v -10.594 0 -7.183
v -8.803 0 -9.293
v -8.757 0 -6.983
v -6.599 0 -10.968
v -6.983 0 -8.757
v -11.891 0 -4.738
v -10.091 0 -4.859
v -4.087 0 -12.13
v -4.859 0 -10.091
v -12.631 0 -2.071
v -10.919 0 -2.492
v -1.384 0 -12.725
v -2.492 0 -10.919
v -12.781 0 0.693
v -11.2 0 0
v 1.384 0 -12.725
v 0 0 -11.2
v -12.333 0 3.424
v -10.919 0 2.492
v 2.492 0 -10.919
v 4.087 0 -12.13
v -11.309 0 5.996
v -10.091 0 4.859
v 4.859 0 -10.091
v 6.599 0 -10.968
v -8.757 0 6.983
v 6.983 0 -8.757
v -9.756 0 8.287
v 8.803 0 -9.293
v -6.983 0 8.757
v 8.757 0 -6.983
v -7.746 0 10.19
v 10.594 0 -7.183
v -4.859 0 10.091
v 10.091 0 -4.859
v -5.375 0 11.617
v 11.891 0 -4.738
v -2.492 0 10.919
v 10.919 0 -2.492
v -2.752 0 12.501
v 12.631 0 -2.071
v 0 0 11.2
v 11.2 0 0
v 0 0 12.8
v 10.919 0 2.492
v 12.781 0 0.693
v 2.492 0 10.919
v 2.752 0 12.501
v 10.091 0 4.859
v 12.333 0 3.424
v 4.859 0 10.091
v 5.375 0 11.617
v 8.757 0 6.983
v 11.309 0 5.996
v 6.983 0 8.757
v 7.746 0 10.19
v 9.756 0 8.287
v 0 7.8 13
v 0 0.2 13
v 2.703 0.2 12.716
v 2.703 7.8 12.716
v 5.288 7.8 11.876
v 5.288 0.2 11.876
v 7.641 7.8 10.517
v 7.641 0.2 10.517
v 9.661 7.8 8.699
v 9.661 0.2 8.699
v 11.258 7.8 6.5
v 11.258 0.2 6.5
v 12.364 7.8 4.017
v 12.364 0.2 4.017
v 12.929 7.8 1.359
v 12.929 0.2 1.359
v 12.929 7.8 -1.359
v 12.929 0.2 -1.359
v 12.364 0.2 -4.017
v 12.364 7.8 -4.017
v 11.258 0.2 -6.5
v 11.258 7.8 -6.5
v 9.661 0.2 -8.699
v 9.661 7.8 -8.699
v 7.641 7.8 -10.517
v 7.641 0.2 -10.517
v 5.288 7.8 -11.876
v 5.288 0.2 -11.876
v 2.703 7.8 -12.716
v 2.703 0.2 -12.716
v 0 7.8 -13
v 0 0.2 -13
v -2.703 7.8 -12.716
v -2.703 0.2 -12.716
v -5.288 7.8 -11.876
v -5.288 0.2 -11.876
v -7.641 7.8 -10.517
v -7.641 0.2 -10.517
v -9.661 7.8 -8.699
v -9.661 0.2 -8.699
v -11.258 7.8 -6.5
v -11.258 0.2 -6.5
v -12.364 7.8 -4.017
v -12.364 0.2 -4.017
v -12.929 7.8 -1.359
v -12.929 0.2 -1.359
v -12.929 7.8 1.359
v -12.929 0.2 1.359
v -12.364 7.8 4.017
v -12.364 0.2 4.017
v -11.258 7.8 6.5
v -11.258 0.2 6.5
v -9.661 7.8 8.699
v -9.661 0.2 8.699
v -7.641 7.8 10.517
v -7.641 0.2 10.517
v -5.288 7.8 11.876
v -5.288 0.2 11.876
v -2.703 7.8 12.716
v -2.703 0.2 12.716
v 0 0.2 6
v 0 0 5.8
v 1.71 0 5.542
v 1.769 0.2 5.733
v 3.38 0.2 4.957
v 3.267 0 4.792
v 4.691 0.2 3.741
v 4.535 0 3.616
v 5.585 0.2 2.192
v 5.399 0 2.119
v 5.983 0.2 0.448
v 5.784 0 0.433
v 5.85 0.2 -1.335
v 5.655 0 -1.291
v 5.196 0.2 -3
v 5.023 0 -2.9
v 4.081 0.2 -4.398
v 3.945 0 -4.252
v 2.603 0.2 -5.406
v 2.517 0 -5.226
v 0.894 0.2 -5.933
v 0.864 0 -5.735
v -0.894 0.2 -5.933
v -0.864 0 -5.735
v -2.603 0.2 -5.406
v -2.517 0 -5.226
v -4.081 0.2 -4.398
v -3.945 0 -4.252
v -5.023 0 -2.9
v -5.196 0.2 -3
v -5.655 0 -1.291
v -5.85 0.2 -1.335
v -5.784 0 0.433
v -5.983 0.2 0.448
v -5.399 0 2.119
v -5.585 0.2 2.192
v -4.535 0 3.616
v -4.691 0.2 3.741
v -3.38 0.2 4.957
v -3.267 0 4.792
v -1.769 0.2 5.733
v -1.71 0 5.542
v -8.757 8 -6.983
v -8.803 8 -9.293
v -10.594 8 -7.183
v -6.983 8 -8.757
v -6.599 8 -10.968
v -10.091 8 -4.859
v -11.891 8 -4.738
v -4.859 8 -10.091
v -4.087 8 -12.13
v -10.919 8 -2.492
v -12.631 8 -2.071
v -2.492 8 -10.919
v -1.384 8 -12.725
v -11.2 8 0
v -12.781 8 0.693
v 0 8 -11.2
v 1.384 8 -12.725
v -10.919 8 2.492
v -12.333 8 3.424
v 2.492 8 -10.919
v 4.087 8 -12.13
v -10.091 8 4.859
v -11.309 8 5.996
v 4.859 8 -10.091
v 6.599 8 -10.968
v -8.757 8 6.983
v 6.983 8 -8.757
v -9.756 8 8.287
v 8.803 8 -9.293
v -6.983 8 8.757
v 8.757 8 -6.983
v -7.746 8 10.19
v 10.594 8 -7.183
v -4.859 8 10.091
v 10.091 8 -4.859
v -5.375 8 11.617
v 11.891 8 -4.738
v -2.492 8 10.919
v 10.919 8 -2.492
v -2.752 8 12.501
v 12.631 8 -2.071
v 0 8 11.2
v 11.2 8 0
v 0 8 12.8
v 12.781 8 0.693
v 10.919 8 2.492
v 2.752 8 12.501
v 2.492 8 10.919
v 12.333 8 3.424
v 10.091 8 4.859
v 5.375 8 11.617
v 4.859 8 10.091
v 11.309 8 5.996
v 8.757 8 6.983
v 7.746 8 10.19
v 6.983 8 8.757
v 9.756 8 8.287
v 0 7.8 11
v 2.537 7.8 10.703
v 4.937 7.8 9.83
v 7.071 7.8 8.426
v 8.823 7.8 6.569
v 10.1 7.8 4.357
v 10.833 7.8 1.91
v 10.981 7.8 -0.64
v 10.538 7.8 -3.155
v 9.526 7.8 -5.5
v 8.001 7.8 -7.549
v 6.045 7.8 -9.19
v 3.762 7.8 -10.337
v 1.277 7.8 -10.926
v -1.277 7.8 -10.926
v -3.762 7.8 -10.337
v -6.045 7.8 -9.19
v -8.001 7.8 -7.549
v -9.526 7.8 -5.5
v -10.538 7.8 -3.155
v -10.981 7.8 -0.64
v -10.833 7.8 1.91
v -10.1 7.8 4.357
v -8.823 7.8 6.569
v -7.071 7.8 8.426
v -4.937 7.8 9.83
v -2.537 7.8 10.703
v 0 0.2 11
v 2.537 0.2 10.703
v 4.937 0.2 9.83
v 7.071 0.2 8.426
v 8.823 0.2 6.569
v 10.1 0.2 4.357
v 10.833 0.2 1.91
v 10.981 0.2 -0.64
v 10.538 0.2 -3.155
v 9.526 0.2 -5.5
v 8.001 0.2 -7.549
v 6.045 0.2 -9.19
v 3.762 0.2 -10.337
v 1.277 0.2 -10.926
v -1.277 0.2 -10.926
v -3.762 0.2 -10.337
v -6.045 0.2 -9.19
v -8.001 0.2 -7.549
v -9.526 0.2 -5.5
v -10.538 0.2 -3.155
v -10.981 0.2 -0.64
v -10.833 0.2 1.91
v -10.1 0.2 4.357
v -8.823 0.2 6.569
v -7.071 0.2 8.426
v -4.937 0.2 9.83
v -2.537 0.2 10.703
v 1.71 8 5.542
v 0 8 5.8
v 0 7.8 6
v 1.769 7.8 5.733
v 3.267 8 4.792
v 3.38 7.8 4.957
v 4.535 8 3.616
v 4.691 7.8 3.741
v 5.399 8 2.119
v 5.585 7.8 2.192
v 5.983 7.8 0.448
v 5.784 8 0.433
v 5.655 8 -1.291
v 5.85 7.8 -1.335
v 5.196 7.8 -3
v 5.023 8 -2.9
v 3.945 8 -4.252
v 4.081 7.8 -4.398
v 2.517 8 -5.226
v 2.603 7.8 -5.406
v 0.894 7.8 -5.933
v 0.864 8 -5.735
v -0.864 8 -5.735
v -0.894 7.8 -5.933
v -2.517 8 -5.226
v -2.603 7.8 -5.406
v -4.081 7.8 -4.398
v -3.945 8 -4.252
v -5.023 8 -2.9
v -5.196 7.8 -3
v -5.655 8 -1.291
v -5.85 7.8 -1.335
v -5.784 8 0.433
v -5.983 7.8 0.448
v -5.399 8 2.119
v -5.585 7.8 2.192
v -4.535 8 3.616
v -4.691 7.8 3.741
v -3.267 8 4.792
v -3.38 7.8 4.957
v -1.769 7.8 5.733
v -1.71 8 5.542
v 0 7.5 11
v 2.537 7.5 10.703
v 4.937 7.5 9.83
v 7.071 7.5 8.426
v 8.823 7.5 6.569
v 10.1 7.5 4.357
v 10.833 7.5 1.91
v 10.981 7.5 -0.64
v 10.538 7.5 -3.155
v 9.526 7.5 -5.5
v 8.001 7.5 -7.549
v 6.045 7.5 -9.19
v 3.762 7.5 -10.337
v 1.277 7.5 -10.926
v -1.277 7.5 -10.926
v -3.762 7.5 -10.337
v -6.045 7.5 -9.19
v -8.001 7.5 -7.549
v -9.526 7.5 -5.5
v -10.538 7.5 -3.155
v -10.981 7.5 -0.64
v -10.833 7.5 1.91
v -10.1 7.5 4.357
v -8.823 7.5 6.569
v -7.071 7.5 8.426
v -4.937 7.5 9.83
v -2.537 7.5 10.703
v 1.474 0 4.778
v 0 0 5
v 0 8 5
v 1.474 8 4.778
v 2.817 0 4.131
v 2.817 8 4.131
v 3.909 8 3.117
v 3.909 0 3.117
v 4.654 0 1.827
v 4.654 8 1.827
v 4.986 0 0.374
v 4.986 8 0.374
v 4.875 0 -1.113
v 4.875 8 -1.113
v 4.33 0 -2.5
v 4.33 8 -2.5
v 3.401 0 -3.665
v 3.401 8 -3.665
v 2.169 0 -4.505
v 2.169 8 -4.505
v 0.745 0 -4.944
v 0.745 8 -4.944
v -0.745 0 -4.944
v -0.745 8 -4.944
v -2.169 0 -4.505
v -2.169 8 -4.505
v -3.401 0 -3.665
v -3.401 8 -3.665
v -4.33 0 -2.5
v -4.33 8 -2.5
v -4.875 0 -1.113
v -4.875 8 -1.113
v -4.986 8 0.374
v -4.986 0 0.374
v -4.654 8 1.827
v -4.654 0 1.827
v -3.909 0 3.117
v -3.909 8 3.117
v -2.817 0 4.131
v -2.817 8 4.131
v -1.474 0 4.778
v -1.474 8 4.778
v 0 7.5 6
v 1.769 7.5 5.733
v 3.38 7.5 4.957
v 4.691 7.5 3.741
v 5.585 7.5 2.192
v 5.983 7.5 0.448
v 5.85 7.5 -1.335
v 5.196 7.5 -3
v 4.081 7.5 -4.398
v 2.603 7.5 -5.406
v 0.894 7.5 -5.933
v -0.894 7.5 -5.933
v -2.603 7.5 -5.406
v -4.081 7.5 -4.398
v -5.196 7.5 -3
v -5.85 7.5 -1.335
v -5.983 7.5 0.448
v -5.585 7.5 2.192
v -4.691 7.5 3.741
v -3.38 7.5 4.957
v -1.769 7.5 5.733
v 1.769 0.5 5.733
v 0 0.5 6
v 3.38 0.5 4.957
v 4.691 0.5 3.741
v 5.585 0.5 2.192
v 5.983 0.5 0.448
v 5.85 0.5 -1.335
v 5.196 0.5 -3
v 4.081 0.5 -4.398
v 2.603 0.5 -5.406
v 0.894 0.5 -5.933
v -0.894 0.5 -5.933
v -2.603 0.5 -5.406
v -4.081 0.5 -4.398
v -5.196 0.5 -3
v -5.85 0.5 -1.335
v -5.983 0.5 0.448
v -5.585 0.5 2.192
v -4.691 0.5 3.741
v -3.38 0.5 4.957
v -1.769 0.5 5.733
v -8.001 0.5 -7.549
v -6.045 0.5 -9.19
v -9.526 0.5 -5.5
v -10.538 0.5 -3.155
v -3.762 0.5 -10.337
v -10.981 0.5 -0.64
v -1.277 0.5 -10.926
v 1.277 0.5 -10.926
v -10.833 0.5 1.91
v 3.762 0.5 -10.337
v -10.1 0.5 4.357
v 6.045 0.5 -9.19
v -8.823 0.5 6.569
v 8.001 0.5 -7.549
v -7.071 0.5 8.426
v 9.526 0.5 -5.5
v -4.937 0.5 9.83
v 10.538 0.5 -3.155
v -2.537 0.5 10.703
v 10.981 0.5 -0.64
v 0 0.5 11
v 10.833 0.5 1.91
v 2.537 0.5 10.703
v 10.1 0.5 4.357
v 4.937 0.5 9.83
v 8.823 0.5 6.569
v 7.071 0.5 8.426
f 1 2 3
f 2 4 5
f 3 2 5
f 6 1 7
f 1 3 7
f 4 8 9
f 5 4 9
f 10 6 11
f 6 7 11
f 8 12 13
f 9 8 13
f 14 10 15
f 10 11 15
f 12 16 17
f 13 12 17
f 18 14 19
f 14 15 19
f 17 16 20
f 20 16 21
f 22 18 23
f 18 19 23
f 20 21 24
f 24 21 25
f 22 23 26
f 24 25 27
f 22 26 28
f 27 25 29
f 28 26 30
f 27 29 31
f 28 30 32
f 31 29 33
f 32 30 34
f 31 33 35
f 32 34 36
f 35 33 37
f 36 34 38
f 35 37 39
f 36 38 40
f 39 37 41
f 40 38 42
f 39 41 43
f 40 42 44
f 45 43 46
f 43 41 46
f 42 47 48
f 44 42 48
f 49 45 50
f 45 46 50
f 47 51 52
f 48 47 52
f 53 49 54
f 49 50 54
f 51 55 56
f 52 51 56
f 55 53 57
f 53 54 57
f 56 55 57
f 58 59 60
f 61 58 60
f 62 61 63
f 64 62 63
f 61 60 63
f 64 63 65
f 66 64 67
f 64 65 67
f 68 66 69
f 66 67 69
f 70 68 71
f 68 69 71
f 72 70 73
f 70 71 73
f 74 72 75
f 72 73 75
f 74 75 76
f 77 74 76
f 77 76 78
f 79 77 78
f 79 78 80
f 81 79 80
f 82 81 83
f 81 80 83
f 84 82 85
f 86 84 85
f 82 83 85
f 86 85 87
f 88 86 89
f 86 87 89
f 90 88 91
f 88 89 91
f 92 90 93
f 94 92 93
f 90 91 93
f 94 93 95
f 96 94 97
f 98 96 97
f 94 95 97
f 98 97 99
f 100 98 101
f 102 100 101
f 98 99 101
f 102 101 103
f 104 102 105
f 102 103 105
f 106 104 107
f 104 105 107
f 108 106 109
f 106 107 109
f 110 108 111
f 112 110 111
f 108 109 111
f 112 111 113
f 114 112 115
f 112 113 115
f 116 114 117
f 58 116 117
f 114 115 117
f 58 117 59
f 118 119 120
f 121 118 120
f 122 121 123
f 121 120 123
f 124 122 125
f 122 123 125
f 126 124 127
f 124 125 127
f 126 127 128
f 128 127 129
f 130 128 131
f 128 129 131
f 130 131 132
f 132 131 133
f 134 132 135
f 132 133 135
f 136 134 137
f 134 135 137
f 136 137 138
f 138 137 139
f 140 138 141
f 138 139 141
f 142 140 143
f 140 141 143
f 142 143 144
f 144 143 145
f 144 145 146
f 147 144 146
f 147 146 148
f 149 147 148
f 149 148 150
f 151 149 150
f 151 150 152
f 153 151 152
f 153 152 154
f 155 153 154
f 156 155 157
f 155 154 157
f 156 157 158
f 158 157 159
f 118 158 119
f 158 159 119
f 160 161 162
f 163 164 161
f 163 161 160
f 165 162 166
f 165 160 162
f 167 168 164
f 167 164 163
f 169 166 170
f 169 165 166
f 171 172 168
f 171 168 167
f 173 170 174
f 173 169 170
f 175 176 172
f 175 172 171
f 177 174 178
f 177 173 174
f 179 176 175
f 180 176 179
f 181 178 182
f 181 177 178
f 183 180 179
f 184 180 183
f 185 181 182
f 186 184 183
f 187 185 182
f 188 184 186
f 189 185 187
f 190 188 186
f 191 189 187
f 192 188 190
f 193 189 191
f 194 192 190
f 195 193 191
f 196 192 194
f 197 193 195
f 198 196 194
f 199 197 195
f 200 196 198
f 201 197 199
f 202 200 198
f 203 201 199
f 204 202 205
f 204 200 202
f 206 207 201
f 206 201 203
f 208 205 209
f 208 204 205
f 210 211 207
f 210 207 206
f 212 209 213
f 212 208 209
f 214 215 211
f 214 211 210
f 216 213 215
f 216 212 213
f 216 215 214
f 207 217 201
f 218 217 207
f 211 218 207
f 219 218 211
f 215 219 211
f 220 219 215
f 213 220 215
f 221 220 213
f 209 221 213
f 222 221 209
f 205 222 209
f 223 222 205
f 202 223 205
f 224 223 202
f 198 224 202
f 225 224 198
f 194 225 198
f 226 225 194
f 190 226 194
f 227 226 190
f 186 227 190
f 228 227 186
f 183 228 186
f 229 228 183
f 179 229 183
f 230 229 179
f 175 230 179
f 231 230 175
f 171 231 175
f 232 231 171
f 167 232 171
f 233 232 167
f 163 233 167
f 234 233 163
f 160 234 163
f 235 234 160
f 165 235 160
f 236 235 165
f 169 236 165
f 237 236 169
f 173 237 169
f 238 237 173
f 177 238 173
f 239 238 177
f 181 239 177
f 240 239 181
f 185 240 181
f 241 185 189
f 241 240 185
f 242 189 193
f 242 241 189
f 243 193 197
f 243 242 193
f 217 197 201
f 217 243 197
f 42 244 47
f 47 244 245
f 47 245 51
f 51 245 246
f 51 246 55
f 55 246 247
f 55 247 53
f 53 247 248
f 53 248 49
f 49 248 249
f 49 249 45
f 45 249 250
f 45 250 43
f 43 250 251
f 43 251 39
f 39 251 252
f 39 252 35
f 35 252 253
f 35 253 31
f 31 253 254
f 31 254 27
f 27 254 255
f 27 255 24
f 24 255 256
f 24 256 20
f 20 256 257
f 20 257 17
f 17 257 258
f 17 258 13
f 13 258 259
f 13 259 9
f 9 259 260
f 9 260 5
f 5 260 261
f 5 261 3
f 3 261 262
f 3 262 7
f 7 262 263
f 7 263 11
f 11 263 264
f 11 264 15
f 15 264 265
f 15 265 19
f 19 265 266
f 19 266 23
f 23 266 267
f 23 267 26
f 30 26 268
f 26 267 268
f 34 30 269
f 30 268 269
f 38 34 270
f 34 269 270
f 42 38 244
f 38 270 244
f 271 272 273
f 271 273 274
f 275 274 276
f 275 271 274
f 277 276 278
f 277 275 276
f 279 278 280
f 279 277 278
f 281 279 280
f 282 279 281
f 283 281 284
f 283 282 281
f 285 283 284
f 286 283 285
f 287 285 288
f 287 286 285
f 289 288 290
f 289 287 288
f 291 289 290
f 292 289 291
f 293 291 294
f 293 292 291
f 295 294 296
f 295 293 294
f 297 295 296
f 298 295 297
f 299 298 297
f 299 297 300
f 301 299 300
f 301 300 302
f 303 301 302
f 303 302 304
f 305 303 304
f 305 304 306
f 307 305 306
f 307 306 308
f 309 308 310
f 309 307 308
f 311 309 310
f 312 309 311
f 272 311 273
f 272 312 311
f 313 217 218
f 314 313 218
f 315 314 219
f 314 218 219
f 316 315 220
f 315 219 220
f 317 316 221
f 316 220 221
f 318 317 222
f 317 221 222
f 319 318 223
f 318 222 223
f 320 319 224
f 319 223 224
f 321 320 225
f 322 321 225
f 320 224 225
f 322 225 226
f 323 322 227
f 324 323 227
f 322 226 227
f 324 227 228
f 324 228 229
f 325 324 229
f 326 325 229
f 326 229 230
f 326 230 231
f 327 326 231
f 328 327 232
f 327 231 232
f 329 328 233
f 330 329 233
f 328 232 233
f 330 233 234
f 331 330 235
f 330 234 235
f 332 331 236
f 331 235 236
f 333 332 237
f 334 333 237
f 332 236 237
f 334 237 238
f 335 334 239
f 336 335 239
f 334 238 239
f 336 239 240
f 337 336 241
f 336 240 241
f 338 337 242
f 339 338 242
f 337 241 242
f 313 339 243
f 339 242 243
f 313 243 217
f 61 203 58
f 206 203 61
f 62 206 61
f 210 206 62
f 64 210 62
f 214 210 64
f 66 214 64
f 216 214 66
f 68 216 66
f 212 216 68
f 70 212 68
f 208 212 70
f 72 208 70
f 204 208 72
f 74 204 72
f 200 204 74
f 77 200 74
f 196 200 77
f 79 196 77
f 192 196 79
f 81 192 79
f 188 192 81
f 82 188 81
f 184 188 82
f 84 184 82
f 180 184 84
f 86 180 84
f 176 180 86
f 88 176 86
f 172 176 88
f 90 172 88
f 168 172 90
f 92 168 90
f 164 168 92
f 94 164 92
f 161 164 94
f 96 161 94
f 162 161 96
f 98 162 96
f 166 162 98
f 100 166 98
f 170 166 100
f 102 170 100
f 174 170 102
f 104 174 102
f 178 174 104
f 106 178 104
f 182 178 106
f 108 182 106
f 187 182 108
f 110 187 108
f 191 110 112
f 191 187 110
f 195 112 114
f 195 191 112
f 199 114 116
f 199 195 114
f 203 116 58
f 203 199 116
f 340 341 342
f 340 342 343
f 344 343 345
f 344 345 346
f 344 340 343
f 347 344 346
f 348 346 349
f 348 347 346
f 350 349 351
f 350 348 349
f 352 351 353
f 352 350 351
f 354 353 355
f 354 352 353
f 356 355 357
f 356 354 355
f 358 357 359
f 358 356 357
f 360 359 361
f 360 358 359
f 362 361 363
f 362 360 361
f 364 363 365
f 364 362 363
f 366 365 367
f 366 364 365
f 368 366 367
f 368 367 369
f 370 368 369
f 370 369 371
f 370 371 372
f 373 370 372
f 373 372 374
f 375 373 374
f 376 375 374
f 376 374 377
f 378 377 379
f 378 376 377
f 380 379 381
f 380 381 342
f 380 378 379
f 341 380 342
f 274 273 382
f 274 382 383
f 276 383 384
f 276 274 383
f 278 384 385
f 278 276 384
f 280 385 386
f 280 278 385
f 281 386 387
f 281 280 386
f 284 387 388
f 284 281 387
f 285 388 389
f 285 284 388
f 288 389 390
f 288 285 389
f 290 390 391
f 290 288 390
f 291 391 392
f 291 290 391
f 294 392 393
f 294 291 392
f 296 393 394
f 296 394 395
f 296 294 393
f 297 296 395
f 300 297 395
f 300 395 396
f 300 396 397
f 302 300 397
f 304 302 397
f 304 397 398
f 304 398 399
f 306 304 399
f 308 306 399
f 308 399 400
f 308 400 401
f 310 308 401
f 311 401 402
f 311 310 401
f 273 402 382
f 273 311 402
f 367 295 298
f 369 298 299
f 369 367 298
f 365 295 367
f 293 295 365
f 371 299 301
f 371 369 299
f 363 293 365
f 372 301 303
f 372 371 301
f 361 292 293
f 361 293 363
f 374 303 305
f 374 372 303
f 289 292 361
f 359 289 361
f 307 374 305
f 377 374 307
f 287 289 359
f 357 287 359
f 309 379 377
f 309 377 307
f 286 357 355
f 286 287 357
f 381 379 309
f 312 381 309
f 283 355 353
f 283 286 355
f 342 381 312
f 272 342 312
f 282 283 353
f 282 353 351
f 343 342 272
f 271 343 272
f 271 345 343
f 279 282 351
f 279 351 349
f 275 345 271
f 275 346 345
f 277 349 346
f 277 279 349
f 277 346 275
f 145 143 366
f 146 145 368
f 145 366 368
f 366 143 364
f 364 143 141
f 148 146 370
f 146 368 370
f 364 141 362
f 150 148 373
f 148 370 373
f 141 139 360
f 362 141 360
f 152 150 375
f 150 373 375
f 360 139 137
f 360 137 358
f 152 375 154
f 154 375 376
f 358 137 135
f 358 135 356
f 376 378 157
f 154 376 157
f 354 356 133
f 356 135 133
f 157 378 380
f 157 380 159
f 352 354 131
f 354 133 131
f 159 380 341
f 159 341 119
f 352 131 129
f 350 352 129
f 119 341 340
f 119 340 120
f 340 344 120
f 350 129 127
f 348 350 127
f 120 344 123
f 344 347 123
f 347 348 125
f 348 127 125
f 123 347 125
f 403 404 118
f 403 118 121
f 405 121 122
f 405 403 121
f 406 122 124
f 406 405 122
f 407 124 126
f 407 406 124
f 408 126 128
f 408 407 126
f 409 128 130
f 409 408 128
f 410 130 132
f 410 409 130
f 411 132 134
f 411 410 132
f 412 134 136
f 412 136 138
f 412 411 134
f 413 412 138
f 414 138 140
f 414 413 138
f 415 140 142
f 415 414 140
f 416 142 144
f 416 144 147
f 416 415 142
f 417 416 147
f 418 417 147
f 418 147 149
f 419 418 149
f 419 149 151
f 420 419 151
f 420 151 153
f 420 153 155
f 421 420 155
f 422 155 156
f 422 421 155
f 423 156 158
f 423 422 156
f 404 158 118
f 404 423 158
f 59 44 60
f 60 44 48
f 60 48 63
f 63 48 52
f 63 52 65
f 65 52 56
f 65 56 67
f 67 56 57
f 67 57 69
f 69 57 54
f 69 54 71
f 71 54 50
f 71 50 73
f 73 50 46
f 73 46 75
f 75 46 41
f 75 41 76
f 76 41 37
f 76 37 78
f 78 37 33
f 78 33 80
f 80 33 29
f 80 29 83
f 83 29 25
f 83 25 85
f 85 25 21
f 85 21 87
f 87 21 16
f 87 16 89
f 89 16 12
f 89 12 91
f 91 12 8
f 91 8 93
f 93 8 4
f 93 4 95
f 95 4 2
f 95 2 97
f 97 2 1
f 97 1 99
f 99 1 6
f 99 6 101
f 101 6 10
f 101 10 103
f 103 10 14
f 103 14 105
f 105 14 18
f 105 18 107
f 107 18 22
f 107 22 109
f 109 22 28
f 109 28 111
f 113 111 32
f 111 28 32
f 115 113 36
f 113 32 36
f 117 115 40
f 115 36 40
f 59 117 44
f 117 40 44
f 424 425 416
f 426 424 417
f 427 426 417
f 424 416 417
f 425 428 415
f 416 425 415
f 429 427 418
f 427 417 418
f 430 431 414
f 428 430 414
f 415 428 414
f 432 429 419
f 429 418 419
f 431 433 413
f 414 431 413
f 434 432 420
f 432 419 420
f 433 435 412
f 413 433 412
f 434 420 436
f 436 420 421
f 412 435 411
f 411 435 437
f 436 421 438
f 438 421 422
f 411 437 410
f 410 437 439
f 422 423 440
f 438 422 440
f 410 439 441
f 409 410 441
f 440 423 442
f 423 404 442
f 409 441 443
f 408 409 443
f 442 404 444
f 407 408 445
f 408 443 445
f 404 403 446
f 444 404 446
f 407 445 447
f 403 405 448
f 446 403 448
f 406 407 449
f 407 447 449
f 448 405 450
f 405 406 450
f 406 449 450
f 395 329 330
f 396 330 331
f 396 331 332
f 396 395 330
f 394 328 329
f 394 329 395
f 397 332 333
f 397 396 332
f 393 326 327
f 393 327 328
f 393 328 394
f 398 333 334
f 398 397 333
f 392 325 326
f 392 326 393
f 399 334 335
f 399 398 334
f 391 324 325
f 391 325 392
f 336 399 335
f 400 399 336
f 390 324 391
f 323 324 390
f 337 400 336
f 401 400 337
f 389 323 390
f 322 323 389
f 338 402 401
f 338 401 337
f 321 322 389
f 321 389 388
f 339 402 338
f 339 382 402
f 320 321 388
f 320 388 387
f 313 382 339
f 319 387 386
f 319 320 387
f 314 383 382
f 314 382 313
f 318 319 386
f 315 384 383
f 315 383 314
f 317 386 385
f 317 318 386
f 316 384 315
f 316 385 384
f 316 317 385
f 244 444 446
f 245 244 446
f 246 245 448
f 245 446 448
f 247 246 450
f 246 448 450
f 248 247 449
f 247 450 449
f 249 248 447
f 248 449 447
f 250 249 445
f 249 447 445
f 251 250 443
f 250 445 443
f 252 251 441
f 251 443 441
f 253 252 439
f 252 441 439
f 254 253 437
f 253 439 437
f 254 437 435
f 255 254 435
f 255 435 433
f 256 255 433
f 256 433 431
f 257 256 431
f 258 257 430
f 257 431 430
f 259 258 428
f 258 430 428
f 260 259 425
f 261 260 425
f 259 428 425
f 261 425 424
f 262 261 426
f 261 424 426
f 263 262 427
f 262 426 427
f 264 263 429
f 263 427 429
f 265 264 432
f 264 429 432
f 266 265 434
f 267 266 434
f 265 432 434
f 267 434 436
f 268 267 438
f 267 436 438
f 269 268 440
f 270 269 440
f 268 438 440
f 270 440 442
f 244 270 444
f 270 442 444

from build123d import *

# Parameters (mm, degrees)
SKETCH1_R           = 13
SKETCH1_R_2         = 5
BOSS_EXTRUDE1_DEPTH = 8
SKETCH2_R           = 11
SKETCH2_R_2         = 6
CUT_EXTRUDE1_DEPTH  = 0.5
CUT_EXTRUDE2_START  = -7.5
SKETCH2_2_R         = 11
SKETCH2_2_R_2       = 6
CUT_EXTRUDE2_DEPTH  = 0.5
CHAMFER1_SIZE       = 0.2


with BuildPart() as part:
    # Sketch1 → Boss-Extrude1 (new body)
    with BuildSketch(Plane(origin=(0, 0, 0), x_dir=(1, 0, 0), z_dir=(0, 1, 0))):
        with Locations(Location((0, 0, 0), (0, 0, 270))):
            Circle(SKETCH1_R)
        with Locations(Location((0, 0, 0), (0, 0, 270))):
            Circle(SKETCH1_R_2, mode=Mode.SUBTRACT)
    extrude(amount=BOSS_EXTRUDE1_DEPTH)

    # Sketch2 → Cut-Extrude1 (cut)
    with BuildSketch(Plane(origin=(0, 8, 0), x_dir=(1, 0, 0), z_dir=(0, 1, 0))):
        with Locations(Location((0, 0, 0), (0, 0, 270))):
            Circle(SKETCH2_R)
        with Locations(Location((0, 0, 0), (0, 0, 270))):
            Circle(SKETCH2_R_2, mode=Mode.SUBTRACT)
    extrude(amount=-CUT_EXTRUDE1_DEPTH, mode=Mode.SUBTRACT)

    # Sketch2<2> → Cut-Extrude2 (cut)
    with BuildSketch(Plane(origin=(0, 8, 0), x_dir=(1, 0, 0), z_dir=(0, 1, 0)).offset(CUT_EXTRUDE2_START)):
        with Locations(Location((0, 0, 0), (0, 0, 270))):
            Circle(SKETCH2_2_R)
        with Locations(Location((0, 0, 0), (0, 0, 270))):
            Circle(SKETCH2_2_R_2, mode=Mode.SUBTRACT)
    extrude(amount=-CUT_EXTRUDE2_DEPTH, mode=Mode.SUBTRACT)

    # Chamfer1
    chamfer1_edges = [part.edges().sort_by_distance(p)[0] for p in [
        (0, 8, -11),
        (0, 8, -6),
        (0, 0, -6),
        (0, 0, -11),
        (0, 0, -13),
        (0, 8, -13),
    ]]
    chamfer(chamfer1_edges, length=CHAMFER1_SIZE)


solid = part.part
